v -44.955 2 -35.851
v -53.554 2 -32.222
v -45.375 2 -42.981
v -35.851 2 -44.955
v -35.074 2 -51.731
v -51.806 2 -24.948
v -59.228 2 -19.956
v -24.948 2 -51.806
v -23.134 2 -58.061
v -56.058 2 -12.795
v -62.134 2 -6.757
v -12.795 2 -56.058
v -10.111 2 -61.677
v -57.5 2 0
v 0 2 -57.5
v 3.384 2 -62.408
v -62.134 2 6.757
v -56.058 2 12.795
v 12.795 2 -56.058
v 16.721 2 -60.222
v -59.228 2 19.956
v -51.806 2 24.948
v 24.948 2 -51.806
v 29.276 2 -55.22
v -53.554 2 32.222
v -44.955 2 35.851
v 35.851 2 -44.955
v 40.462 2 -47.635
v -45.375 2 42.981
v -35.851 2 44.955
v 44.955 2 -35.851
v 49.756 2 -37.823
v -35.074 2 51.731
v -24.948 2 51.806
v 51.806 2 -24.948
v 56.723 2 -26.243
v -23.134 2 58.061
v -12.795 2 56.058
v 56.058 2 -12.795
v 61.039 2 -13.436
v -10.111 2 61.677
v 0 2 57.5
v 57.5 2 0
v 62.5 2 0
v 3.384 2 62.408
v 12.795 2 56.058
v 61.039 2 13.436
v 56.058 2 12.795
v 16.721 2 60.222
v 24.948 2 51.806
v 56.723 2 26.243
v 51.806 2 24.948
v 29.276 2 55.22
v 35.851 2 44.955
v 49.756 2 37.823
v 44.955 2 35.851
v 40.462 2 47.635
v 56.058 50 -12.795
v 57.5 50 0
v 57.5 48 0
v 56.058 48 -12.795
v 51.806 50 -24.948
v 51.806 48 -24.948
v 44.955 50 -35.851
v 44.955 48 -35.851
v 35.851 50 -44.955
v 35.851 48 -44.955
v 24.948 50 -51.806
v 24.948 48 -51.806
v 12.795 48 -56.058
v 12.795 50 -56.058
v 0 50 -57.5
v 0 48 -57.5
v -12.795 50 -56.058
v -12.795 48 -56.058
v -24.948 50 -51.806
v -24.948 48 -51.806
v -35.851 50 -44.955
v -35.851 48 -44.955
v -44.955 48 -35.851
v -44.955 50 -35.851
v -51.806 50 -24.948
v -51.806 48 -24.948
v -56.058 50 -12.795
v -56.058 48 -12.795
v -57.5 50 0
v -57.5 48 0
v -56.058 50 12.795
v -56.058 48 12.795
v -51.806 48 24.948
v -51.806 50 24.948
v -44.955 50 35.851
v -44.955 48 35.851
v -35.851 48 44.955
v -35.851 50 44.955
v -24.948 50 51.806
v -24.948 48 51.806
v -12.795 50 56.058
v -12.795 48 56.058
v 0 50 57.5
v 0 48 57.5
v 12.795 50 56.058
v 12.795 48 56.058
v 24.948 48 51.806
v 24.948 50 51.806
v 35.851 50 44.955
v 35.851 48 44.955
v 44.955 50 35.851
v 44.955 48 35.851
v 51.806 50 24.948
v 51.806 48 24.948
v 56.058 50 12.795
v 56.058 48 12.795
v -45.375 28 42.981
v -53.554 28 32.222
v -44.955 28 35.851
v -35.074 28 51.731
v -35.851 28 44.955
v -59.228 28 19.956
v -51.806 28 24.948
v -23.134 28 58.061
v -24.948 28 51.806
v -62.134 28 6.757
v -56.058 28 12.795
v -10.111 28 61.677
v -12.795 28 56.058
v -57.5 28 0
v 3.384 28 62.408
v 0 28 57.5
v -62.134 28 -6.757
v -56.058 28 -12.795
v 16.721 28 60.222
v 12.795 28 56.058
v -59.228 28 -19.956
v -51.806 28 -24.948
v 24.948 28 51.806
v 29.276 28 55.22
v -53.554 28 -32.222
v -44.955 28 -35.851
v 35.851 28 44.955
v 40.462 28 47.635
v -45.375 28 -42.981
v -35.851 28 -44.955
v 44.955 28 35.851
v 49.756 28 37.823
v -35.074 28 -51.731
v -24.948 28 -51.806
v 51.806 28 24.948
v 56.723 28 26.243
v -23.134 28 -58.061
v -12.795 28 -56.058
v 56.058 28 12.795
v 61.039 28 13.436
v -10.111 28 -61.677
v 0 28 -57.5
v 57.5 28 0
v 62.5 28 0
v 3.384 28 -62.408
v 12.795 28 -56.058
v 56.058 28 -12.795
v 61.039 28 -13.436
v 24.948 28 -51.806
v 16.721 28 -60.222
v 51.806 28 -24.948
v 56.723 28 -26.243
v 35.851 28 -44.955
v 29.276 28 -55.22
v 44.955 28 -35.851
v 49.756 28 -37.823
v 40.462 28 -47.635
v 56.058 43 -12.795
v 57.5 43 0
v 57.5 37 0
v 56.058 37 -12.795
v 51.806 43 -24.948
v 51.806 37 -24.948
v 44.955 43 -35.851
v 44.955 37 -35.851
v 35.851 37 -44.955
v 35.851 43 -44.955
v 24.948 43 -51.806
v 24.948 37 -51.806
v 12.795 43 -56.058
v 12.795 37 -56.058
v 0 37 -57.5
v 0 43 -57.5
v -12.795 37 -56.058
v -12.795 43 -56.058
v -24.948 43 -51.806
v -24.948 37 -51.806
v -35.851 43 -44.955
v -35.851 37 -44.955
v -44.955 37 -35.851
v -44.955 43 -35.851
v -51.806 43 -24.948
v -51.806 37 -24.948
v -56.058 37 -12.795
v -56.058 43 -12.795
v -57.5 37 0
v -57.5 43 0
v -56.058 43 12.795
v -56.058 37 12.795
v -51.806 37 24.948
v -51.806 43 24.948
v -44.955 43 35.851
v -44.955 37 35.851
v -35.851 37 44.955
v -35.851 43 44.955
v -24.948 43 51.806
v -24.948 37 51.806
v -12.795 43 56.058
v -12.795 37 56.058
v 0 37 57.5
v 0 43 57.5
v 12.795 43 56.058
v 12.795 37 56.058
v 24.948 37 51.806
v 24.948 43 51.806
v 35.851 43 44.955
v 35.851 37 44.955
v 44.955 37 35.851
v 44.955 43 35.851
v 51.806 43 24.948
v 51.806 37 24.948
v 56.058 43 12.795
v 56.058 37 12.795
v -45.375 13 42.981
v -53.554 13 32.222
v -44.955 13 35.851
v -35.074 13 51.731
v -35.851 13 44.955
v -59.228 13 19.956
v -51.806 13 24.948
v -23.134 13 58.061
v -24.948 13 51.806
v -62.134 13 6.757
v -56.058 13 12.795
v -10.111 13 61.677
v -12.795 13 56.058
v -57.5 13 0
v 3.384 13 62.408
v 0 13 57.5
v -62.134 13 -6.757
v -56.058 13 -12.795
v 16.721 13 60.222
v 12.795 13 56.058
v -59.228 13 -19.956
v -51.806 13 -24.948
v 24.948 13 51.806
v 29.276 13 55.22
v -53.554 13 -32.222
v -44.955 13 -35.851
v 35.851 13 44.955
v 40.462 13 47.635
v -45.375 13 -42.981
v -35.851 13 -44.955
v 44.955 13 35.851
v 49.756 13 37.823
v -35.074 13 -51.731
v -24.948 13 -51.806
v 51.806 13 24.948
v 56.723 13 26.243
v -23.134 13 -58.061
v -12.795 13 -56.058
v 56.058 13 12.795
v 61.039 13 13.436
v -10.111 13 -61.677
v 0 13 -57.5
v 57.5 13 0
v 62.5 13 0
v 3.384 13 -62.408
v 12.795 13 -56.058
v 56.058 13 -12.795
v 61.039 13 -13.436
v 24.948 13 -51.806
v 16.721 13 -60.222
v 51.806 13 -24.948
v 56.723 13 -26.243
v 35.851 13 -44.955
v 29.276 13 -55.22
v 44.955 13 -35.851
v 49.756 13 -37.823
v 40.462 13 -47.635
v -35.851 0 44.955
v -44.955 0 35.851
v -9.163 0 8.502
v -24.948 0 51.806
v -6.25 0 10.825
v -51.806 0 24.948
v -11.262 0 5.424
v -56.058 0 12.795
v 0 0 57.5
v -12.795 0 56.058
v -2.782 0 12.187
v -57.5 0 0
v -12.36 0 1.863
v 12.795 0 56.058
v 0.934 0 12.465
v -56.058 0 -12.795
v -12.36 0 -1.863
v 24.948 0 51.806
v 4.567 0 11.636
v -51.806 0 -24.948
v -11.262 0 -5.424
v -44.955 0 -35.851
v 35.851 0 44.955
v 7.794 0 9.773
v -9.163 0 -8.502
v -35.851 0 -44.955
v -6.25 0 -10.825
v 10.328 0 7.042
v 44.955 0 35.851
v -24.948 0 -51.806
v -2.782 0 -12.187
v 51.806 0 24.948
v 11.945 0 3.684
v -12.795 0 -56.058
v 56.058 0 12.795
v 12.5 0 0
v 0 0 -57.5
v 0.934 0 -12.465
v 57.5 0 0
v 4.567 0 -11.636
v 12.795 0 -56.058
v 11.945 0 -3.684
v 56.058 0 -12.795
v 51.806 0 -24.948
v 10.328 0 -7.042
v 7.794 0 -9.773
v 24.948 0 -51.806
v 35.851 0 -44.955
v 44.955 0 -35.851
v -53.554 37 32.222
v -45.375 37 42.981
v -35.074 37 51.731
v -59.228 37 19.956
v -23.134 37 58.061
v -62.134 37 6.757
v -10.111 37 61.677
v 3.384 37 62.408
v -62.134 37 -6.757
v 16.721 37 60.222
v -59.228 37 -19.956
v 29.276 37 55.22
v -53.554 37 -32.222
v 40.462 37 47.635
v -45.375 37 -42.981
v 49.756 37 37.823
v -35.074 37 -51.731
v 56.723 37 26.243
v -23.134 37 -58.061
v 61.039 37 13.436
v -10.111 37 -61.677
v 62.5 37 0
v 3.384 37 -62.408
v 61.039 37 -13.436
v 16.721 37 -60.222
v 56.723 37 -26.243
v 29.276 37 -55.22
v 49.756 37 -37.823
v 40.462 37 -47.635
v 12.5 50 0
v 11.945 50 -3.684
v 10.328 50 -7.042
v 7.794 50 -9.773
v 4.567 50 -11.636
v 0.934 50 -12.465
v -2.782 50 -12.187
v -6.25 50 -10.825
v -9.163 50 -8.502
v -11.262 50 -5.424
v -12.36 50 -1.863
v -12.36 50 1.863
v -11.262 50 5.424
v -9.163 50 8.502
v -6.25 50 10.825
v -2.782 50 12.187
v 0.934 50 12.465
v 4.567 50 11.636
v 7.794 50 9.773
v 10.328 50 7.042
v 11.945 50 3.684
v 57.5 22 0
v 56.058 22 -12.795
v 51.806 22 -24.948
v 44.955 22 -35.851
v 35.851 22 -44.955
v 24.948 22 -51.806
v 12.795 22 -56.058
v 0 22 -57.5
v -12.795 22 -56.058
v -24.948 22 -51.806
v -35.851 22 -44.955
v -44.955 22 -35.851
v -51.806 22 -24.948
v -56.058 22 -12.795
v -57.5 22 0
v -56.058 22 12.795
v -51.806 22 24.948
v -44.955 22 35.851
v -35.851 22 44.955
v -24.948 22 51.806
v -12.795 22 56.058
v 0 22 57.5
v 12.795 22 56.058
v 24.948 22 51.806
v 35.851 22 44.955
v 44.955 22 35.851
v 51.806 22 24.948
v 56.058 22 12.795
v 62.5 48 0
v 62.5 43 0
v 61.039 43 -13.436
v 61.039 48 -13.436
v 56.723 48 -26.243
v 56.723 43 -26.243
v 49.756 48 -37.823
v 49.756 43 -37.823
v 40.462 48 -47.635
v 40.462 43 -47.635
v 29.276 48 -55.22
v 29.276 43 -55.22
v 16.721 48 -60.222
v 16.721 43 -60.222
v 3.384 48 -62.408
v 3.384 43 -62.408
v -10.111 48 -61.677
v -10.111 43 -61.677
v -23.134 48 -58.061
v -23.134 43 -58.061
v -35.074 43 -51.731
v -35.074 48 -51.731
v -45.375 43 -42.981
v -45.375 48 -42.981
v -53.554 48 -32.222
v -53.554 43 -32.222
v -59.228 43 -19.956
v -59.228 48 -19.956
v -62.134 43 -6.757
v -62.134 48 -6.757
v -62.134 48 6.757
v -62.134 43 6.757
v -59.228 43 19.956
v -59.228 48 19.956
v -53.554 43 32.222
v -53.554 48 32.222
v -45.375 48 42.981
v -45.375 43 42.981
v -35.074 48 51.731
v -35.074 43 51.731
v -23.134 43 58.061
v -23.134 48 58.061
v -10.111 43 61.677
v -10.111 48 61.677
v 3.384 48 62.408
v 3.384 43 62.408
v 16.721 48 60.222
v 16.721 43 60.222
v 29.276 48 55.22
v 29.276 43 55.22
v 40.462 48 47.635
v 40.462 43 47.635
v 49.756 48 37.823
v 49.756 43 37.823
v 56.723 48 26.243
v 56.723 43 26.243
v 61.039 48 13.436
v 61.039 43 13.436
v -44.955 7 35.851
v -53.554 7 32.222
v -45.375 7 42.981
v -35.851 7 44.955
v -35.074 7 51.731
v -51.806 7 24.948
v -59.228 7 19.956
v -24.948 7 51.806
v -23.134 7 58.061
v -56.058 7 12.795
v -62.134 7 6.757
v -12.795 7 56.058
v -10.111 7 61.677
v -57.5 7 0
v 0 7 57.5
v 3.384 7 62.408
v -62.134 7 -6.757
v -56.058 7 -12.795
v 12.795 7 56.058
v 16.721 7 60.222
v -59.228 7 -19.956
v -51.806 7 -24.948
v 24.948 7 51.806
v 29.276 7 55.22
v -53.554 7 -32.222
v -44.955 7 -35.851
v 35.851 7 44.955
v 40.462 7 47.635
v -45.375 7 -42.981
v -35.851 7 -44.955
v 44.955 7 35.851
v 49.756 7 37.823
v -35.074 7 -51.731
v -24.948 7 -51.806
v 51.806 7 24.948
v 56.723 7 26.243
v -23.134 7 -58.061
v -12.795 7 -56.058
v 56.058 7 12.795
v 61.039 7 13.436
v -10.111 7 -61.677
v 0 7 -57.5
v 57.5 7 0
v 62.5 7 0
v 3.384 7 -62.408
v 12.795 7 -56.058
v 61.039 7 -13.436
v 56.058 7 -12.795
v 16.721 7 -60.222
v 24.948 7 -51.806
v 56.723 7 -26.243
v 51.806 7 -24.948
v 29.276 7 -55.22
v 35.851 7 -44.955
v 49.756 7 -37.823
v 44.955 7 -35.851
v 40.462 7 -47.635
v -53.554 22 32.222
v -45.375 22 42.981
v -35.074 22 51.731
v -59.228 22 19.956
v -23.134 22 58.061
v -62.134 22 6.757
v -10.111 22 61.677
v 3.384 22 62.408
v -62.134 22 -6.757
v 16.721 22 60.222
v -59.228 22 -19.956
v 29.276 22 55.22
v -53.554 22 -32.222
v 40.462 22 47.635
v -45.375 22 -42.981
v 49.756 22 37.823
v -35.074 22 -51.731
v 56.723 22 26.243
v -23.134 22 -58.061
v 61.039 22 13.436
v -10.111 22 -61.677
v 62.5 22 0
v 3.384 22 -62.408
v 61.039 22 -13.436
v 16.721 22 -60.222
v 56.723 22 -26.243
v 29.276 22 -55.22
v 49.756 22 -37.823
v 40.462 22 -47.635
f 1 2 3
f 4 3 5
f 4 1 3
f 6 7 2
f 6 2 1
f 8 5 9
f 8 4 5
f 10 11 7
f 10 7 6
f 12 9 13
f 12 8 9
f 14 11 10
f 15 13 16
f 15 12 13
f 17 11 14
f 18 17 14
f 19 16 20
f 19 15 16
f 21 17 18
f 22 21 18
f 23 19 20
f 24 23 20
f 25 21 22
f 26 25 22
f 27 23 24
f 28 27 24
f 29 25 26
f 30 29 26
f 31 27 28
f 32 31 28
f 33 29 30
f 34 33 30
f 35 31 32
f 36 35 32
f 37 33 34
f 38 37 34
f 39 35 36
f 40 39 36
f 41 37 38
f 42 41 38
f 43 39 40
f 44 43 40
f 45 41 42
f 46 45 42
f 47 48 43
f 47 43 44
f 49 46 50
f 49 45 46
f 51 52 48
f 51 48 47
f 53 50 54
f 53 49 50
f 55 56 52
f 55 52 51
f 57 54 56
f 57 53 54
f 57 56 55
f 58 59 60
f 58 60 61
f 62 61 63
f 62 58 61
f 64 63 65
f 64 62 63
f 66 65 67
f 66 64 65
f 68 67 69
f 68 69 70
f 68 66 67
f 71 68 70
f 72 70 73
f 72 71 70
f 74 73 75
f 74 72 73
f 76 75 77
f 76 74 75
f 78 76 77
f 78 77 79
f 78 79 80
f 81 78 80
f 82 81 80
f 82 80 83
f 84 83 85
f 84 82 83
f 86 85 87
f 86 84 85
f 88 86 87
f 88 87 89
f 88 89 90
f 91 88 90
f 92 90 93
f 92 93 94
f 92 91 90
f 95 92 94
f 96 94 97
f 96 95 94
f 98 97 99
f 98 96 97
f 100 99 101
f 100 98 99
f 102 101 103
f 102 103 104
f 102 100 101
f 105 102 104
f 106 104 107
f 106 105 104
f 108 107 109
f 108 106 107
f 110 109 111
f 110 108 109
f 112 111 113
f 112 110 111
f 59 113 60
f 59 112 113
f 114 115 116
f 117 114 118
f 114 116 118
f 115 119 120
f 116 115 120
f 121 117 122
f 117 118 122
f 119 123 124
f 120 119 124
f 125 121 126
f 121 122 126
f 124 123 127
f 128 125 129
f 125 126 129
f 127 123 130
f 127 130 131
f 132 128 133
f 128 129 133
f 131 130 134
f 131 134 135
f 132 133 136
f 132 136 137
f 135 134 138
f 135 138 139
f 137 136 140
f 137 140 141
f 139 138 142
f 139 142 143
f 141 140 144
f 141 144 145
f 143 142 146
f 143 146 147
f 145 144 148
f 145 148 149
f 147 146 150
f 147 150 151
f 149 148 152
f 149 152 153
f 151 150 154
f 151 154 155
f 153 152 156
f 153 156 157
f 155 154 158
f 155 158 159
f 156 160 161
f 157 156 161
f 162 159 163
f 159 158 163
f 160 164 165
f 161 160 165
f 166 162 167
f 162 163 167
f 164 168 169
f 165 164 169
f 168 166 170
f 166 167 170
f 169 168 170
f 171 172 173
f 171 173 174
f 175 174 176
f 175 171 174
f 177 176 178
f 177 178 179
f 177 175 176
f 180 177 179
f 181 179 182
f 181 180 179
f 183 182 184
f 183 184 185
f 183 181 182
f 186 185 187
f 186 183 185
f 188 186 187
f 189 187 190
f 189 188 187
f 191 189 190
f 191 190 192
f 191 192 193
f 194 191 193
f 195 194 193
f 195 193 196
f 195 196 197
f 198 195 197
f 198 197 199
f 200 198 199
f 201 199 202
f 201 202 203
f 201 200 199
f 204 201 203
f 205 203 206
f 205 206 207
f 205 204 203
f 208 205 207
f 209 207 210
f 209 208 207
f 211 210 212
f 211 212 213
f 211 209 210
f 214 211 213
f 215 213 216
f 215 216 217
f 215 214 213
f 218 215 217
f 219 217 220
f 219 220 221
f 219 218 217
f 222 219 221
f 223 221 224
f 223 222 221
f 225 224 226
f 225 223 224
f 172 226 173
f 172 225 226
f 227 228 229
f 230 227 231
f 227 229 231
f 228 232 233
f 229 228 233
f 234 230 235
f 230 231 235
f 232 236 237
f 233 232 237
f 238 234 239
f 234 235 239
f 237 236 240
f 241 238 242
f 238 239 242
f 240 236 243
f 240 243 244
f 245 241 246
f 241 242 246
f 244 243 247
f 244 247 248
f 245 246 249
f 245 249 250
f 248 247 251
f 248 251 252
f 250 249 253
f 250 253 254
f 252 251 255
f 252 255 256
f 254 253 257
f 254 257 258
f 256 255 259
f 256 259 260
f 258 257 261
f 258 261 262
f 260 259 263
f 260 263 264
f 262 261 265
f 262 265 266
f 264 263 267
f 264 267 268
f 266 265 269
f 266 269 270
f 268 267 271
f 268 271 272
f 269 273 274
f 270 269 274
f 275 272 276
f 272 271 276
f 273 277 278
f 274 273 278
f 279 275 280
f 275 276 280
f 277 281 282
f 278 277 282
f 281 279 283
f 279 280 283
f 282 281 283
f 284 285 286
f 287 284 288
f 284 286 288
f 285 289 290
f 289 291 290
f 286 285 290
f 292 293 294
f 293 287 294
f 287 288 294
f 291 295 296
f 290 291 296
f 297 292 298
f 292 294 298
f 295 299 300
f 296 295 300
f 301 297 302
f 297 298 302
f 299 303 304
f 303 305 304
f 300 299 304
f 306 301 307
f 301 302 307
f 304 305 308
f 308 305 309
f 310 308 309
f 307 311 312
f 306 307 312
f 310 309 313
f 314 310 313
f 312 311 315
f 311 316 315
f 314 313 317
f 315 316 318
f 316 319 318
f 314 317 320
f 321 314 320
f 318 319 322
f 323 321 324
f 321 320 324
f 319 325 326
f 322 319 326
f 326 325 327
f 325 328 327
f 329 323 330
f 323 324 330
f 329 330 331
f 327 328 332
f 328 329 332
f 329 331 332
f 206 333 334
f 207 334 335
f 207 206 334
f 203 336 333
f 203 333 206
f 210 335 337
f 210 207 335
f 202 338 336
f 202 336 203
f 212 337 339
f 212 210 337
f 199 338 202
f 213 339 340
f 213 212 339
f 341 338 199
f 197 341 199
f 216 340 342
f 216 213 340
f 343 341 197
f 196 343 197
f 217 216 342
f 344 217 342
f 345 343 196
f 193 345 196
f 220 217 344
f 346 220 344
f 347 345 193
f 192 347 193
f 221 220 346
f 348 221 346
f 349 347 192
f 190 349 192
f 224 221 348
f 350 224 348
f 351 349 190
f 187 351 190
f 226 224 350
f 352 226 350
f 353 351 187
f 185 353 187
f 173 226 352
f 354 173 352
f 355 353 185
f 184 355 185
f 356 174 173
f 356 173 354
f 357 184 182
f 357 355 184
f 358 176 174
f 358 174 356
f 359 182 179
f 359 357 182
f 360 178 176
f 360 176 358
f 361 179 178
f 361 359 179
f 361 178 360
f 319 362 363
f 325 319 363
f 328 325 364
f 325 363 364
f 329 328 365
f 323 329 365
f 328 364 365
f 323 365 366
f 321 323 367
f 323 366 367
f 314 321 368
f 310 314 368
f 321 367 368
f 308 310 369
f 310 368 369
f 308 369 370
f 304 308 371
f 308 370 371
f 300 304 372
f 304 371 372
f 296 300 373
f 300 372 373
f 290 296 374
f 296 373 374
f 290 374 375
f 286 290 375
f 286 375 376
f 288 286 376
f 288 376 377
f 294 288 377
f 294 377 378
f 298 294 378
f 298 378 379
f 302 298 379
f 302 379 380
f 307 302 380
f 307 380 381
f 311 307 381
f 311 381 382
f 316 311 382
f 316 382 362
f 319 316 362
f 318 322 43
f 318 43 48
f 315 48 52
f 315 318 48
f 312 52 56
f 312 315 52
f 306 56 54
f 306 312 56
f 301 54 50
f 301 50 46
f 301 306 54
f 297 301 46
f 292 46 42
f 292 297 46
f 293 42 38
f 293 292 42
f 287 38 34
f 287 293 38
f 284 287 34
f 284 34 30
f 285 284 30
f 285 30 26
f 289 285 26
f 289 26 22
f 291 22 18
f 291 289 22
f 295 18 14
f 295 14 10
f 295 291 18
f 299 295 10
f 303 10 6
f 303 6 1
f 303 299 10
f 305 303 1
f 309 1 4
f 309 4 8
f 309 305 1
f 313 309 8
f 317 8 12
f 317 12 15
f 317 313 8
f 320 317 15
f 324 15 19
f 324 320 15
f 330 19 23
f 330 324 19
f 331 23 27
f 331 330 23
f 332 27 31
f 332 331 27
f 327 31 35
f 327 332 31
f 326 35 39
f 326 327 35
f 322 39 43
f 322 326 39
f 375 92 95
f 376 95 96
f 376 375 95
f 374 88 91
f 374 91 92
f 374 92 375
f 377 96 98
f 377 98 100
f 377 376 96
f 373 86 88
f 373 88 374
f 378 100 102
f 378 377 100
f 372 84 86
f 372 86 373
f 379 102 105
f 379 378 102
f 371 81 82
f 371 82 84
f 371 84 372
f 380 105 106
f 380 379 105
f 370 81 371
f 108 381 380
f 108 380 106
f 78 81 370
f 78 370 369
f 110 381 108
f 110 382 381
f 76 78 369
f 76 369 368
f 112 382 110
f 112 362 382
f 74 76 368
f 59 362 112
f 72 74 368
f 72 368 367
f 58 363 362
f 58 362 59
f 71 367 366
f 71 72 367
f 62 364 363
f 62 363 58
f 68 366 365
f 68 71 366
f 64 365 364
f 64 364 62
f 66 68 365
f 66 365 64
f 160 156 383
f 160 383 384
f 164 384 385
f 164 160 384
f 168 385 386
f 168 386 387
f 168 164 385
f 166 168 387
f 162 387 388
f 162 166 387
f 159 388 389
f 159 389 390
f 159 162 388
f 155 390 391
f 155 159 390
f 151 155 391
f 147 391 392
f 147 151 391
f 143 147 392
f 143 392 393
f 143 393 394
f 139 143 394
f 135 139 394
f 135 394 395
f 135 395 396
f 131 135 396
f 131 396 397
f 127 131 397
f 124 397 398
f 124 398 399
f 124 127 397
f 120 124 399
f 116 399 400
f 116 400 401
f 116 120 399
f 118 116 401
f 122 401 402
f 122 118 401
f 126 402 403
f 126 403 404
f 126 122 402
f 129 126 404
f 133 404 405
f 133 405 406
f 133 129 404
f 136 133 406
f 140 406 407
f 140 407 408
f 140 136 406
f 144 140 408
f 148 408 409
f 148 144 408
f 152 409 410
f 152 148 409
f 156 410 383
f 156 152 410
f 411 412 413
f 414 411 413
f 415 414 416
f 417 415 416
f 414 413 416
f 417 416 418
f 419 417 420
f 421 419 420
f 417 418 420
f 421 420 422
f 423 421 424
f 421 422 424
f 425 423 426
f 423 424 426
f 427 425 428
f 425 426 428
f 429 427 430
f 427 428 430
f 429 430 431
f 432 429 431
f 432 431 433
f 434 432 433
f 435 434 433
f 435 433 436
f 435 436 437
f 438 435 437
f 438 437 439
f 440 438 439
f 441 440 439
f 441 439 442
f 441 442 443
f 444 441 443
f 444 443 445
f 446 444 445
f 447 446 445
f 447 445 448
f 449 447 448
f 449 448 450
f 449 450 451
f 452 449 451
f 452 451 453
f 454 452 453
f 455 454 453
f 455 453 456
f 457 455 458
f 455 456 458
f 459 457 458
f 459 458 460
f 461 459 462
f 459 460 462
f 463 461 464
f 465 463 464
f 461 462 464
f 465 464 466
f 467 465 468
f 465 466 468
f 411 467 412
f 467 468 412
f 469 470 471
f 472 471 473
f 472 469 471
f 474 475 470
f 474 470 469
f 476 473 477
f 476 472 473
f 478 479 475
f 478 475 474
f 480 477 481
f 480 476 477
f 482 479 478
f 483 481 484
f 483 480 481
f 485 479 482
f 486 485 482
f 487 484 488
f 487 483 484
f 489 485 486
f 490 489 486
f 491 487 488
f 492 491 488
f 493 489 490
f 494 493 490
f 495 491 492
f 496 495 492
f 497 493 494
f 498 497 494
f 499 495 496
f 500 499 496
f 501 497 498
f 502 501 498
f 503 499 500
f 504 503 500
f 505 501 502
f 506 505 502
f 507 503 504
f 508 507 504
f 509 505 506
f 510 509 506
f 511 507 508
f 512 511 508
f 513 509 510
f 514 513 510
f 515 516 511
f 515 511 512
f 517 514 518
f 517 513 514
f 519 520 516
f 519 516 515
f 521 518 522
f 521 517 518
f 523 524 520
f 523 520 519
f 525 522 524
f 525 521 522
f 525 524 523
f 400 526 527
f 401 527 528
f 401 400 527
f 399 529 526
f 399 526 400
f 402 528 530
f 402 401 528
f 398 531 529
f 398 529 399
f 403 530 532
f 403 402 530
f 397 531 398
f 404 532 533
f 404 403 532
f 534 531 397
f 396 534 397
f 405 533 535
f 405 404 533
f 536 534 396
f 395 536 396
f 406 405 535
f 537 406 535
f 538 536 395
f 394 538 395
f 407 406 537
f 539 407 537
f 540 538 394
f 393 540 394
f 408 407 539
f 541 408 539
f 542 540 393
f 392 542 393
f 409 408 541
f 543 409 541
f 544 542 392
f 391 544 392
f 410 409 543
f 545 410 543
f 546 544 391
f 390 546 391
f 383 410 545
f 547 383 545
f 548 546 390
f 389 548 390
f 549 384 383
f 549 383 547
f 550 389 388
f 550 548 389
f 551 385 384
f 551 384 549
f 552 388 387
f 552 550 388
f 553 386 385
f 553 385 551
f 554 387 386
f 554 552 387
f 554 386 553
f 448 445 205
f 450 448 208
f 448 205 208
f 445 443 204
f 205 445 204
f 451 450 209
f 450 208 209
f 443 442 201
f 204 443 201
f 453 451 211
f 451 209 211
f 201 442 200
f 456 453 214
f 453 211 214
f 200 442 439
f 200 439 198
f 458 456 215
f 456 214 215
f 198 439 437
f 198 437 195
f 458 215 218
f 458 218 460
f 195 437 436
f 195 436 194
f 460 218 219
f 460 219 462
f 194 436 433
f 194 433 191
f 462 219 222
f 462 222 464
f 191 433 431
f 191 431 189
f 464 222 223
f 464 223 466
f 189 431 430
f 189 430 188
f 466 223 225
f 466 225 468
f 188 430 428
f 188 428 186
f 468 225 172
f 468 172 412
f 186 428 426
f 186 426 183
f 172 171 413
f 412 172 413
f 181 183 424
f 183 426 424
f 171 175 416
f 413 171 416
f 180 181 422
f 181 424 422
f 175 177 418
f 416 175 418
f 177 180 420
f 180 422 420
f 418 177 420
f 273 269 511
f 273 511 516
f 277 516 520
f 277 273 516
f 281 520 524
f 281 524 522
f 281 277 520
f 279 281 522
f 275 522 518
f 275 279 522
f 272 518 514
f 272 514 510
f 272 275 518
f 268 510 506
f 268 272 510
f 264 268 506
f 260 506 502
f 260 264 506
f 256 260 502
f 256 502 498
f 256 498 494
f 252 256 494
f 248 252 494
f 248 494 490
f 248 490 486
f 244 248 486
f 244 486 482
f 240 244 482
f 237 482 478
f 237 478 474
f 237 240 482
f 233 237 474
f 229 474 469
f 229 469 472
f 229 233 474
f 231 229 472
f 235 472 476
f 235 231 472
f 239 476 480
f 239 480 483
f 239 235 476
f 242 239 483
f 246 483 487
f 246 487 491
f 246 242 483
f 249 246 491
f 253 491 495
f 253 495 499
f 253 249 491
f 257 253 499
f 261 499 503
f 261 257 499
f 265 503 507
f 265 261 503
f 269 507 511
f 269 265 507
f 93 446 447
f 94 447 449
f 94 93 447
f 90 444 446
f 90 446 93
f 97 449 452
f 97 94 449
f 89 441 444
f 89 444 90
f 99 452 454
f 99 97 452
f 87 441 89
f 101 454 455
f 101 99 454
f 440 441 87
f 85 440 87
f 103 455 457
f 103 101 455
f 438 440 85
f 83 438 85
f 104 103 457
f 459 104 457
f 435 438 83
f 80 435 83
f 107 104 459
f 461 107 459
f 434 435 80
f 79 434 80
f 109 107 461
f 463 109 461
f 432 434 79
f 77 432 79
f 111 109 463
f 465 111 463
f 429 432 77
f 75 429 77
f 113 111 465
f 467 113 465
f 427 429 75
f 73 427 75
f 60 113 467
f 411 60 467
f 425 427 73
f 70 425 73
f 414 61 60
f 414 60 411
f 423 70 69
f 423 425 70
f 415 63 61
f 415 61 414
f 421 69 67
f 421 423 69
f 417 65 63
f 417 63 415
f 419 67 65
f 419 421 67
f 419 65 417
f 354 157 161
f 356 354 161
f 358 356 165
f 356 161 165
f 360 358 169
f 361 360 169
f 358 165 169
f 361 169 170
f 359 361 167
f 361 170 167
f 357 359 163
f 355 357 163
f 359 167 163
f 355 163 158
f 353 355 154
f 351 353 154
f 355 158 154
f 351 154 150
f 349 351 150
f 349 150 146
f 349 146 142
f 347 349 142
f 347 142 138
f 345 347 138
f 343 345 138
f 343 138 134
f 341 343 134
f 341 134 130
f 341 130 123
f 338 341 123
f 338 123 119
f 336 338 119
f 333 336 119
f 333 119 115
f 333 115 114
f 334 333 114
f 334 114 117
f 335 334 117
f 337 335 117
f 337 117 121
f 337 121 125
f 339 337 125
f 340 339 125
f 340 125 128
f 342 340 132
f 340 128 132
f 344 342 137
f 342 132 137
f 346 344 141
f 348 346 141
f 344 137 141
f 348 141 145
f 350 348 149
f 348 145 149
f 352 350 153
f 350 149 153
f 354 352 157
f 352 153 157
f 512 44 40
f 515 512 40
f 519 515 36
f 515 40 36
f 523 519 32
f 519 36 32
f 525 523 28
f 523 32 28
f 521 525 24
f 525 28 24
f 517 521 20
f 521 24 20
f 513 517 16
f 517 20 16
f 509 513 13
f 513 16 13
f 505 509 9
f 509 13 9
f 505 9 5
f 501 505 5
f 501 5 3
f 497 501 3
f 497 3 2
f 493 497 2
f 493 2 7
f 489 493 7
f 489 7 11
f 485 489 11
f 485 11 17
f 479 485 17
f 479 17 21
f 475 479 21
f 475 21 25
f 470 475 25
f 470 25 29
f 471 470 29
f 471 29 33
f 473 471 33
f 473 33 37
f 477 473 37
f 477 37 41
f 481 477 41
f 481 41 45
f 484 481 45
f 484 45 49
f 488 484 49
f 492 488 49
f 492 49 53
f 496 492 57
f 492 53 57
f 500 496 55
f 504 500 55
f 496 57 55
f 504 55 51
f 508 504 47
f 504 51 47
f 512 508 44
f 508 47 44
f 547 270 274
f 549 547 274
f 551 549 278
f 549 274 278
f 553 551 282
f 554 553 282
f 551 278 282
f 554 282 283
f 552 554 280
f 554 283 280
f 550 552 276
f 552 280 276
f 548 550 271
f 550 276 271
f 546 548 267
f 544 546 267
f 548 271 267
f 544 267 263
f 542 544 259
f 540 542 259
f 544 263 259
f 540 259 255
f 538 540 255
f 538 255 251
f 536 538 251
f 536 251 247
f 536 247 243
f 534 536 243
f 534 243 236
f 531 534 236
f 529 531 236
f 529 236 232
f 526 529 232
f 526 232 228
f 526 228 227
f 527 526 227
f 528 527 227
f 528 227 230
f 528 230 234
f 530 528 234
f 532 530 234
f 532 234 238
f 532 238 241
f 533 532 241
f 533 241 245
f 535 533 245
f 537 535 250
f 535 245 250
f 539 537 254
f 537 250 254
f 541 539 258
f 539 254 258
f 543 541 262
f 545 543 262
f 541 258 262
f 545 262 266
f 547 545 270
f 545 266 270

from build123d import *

# Parameters (mm, degrees)
SKETCH_1_R             = 62.5
EXTRUDE_1_DEPTH        = 50
CUT_EXTRUDE_START      = -7
SKETCH_2_R             = 62.5
SKETCH_2_R_2           = 57.5
CUT_EXTRUDE_1_DEPTH    = 6
PATTERN_LINEAR_1_COUNT = 3
PATTERN_LINEAR_1_PITCH = 15
SKETCH_3_R             = 62.5
SKETCH_3_R_2           = 57.5
CUT_EXTRUDE_2_DEPTH    = 2
SKETCH_4_R             = 62.5
SKETCH_4_R_2           = 57.5
CUT_EXTRUDE_3_DEPTH    = 2
SKETCH_5_R             = 12.5
CUT_EXTRUDE_4_DEPTH    = 51


with BuildPart() as part:
    # 草图1 → 凸台-拉伸1 (new body)
    with BuildSketch(Plane(origin=(0, 0, 0), x_dir=(1, 0, 0), z_dir=(0, 1, 0))):
        Circle(SKETCH_1_R)
    extrude(amount=EXTRUDE_1_DEPTH)

    # 草图2 → 切除-拉伸1 (cut)
    with BuildSketch(Plane(origin=(0, 50, 0), x_dir=(1, 0, 0), z_dir=(0, 1, 0)).offset(CUT_EXTRUDE_START)):
        Circle(SKETCH_2_R)
        Circle(SKETCH_2_R_2, mode=Mode.SUBTRACT)
    cut_extrude_1 = extrude(amount=-CUT_EXTRUDE_1_DEPTH, mode=Mode.SUBTRACT)

    # 阵列(线性)1: 切除-拉伸1 ×3
    with Locations(*[(0, -i * PATTERN_LINEAR_1_PITCH, 0) for i in range(1, PATTERN_LINEAR_1_COUNT)]):
        add(cut_extrude_1, mode=Mode.SUBTRACT)

    # 草图3 → 切除-拉伸2 (cut)
    with BuildSketch(Plane(origin=(0, 50, 0), x_dir=(1, 0, 0), z_dir=(0, 1, 0))):
        Circle(SKETCH_3_R)
        Circle(SKETCH_3_R_2, mode=Mode.SUBTRACT)
    extrude(amount=-CUT_EXTRUDE_2_DEPTH, mode=Mode.SUBTRACT)

    # 草图4 → 切除-拉伸3 (cut)
    with BuildSketch(Plane.XZ):
        Circle(SKETCH_4_R)
        Circle(SKETCH_4_R_2, mode=Mode.SUBTRACT)
    extrude(amount=-CUT_EXTRUDE_3_DEPTH, mode=Mode.SUBTRACT)

    # 草图5 → 切除-拉伸4 (cut, through all)
    with BuildSketch(Plane(origin=(0, 50, 0), x_dir=(1, 0, 0), z_dir=(0, 1, 0))):
        Circle(SKETCH_5_R)
    extrude(amount=-CUT_EXTRUDE_4_DEPTH, mode=Mode.SUBTRACT)


solid = part.part
